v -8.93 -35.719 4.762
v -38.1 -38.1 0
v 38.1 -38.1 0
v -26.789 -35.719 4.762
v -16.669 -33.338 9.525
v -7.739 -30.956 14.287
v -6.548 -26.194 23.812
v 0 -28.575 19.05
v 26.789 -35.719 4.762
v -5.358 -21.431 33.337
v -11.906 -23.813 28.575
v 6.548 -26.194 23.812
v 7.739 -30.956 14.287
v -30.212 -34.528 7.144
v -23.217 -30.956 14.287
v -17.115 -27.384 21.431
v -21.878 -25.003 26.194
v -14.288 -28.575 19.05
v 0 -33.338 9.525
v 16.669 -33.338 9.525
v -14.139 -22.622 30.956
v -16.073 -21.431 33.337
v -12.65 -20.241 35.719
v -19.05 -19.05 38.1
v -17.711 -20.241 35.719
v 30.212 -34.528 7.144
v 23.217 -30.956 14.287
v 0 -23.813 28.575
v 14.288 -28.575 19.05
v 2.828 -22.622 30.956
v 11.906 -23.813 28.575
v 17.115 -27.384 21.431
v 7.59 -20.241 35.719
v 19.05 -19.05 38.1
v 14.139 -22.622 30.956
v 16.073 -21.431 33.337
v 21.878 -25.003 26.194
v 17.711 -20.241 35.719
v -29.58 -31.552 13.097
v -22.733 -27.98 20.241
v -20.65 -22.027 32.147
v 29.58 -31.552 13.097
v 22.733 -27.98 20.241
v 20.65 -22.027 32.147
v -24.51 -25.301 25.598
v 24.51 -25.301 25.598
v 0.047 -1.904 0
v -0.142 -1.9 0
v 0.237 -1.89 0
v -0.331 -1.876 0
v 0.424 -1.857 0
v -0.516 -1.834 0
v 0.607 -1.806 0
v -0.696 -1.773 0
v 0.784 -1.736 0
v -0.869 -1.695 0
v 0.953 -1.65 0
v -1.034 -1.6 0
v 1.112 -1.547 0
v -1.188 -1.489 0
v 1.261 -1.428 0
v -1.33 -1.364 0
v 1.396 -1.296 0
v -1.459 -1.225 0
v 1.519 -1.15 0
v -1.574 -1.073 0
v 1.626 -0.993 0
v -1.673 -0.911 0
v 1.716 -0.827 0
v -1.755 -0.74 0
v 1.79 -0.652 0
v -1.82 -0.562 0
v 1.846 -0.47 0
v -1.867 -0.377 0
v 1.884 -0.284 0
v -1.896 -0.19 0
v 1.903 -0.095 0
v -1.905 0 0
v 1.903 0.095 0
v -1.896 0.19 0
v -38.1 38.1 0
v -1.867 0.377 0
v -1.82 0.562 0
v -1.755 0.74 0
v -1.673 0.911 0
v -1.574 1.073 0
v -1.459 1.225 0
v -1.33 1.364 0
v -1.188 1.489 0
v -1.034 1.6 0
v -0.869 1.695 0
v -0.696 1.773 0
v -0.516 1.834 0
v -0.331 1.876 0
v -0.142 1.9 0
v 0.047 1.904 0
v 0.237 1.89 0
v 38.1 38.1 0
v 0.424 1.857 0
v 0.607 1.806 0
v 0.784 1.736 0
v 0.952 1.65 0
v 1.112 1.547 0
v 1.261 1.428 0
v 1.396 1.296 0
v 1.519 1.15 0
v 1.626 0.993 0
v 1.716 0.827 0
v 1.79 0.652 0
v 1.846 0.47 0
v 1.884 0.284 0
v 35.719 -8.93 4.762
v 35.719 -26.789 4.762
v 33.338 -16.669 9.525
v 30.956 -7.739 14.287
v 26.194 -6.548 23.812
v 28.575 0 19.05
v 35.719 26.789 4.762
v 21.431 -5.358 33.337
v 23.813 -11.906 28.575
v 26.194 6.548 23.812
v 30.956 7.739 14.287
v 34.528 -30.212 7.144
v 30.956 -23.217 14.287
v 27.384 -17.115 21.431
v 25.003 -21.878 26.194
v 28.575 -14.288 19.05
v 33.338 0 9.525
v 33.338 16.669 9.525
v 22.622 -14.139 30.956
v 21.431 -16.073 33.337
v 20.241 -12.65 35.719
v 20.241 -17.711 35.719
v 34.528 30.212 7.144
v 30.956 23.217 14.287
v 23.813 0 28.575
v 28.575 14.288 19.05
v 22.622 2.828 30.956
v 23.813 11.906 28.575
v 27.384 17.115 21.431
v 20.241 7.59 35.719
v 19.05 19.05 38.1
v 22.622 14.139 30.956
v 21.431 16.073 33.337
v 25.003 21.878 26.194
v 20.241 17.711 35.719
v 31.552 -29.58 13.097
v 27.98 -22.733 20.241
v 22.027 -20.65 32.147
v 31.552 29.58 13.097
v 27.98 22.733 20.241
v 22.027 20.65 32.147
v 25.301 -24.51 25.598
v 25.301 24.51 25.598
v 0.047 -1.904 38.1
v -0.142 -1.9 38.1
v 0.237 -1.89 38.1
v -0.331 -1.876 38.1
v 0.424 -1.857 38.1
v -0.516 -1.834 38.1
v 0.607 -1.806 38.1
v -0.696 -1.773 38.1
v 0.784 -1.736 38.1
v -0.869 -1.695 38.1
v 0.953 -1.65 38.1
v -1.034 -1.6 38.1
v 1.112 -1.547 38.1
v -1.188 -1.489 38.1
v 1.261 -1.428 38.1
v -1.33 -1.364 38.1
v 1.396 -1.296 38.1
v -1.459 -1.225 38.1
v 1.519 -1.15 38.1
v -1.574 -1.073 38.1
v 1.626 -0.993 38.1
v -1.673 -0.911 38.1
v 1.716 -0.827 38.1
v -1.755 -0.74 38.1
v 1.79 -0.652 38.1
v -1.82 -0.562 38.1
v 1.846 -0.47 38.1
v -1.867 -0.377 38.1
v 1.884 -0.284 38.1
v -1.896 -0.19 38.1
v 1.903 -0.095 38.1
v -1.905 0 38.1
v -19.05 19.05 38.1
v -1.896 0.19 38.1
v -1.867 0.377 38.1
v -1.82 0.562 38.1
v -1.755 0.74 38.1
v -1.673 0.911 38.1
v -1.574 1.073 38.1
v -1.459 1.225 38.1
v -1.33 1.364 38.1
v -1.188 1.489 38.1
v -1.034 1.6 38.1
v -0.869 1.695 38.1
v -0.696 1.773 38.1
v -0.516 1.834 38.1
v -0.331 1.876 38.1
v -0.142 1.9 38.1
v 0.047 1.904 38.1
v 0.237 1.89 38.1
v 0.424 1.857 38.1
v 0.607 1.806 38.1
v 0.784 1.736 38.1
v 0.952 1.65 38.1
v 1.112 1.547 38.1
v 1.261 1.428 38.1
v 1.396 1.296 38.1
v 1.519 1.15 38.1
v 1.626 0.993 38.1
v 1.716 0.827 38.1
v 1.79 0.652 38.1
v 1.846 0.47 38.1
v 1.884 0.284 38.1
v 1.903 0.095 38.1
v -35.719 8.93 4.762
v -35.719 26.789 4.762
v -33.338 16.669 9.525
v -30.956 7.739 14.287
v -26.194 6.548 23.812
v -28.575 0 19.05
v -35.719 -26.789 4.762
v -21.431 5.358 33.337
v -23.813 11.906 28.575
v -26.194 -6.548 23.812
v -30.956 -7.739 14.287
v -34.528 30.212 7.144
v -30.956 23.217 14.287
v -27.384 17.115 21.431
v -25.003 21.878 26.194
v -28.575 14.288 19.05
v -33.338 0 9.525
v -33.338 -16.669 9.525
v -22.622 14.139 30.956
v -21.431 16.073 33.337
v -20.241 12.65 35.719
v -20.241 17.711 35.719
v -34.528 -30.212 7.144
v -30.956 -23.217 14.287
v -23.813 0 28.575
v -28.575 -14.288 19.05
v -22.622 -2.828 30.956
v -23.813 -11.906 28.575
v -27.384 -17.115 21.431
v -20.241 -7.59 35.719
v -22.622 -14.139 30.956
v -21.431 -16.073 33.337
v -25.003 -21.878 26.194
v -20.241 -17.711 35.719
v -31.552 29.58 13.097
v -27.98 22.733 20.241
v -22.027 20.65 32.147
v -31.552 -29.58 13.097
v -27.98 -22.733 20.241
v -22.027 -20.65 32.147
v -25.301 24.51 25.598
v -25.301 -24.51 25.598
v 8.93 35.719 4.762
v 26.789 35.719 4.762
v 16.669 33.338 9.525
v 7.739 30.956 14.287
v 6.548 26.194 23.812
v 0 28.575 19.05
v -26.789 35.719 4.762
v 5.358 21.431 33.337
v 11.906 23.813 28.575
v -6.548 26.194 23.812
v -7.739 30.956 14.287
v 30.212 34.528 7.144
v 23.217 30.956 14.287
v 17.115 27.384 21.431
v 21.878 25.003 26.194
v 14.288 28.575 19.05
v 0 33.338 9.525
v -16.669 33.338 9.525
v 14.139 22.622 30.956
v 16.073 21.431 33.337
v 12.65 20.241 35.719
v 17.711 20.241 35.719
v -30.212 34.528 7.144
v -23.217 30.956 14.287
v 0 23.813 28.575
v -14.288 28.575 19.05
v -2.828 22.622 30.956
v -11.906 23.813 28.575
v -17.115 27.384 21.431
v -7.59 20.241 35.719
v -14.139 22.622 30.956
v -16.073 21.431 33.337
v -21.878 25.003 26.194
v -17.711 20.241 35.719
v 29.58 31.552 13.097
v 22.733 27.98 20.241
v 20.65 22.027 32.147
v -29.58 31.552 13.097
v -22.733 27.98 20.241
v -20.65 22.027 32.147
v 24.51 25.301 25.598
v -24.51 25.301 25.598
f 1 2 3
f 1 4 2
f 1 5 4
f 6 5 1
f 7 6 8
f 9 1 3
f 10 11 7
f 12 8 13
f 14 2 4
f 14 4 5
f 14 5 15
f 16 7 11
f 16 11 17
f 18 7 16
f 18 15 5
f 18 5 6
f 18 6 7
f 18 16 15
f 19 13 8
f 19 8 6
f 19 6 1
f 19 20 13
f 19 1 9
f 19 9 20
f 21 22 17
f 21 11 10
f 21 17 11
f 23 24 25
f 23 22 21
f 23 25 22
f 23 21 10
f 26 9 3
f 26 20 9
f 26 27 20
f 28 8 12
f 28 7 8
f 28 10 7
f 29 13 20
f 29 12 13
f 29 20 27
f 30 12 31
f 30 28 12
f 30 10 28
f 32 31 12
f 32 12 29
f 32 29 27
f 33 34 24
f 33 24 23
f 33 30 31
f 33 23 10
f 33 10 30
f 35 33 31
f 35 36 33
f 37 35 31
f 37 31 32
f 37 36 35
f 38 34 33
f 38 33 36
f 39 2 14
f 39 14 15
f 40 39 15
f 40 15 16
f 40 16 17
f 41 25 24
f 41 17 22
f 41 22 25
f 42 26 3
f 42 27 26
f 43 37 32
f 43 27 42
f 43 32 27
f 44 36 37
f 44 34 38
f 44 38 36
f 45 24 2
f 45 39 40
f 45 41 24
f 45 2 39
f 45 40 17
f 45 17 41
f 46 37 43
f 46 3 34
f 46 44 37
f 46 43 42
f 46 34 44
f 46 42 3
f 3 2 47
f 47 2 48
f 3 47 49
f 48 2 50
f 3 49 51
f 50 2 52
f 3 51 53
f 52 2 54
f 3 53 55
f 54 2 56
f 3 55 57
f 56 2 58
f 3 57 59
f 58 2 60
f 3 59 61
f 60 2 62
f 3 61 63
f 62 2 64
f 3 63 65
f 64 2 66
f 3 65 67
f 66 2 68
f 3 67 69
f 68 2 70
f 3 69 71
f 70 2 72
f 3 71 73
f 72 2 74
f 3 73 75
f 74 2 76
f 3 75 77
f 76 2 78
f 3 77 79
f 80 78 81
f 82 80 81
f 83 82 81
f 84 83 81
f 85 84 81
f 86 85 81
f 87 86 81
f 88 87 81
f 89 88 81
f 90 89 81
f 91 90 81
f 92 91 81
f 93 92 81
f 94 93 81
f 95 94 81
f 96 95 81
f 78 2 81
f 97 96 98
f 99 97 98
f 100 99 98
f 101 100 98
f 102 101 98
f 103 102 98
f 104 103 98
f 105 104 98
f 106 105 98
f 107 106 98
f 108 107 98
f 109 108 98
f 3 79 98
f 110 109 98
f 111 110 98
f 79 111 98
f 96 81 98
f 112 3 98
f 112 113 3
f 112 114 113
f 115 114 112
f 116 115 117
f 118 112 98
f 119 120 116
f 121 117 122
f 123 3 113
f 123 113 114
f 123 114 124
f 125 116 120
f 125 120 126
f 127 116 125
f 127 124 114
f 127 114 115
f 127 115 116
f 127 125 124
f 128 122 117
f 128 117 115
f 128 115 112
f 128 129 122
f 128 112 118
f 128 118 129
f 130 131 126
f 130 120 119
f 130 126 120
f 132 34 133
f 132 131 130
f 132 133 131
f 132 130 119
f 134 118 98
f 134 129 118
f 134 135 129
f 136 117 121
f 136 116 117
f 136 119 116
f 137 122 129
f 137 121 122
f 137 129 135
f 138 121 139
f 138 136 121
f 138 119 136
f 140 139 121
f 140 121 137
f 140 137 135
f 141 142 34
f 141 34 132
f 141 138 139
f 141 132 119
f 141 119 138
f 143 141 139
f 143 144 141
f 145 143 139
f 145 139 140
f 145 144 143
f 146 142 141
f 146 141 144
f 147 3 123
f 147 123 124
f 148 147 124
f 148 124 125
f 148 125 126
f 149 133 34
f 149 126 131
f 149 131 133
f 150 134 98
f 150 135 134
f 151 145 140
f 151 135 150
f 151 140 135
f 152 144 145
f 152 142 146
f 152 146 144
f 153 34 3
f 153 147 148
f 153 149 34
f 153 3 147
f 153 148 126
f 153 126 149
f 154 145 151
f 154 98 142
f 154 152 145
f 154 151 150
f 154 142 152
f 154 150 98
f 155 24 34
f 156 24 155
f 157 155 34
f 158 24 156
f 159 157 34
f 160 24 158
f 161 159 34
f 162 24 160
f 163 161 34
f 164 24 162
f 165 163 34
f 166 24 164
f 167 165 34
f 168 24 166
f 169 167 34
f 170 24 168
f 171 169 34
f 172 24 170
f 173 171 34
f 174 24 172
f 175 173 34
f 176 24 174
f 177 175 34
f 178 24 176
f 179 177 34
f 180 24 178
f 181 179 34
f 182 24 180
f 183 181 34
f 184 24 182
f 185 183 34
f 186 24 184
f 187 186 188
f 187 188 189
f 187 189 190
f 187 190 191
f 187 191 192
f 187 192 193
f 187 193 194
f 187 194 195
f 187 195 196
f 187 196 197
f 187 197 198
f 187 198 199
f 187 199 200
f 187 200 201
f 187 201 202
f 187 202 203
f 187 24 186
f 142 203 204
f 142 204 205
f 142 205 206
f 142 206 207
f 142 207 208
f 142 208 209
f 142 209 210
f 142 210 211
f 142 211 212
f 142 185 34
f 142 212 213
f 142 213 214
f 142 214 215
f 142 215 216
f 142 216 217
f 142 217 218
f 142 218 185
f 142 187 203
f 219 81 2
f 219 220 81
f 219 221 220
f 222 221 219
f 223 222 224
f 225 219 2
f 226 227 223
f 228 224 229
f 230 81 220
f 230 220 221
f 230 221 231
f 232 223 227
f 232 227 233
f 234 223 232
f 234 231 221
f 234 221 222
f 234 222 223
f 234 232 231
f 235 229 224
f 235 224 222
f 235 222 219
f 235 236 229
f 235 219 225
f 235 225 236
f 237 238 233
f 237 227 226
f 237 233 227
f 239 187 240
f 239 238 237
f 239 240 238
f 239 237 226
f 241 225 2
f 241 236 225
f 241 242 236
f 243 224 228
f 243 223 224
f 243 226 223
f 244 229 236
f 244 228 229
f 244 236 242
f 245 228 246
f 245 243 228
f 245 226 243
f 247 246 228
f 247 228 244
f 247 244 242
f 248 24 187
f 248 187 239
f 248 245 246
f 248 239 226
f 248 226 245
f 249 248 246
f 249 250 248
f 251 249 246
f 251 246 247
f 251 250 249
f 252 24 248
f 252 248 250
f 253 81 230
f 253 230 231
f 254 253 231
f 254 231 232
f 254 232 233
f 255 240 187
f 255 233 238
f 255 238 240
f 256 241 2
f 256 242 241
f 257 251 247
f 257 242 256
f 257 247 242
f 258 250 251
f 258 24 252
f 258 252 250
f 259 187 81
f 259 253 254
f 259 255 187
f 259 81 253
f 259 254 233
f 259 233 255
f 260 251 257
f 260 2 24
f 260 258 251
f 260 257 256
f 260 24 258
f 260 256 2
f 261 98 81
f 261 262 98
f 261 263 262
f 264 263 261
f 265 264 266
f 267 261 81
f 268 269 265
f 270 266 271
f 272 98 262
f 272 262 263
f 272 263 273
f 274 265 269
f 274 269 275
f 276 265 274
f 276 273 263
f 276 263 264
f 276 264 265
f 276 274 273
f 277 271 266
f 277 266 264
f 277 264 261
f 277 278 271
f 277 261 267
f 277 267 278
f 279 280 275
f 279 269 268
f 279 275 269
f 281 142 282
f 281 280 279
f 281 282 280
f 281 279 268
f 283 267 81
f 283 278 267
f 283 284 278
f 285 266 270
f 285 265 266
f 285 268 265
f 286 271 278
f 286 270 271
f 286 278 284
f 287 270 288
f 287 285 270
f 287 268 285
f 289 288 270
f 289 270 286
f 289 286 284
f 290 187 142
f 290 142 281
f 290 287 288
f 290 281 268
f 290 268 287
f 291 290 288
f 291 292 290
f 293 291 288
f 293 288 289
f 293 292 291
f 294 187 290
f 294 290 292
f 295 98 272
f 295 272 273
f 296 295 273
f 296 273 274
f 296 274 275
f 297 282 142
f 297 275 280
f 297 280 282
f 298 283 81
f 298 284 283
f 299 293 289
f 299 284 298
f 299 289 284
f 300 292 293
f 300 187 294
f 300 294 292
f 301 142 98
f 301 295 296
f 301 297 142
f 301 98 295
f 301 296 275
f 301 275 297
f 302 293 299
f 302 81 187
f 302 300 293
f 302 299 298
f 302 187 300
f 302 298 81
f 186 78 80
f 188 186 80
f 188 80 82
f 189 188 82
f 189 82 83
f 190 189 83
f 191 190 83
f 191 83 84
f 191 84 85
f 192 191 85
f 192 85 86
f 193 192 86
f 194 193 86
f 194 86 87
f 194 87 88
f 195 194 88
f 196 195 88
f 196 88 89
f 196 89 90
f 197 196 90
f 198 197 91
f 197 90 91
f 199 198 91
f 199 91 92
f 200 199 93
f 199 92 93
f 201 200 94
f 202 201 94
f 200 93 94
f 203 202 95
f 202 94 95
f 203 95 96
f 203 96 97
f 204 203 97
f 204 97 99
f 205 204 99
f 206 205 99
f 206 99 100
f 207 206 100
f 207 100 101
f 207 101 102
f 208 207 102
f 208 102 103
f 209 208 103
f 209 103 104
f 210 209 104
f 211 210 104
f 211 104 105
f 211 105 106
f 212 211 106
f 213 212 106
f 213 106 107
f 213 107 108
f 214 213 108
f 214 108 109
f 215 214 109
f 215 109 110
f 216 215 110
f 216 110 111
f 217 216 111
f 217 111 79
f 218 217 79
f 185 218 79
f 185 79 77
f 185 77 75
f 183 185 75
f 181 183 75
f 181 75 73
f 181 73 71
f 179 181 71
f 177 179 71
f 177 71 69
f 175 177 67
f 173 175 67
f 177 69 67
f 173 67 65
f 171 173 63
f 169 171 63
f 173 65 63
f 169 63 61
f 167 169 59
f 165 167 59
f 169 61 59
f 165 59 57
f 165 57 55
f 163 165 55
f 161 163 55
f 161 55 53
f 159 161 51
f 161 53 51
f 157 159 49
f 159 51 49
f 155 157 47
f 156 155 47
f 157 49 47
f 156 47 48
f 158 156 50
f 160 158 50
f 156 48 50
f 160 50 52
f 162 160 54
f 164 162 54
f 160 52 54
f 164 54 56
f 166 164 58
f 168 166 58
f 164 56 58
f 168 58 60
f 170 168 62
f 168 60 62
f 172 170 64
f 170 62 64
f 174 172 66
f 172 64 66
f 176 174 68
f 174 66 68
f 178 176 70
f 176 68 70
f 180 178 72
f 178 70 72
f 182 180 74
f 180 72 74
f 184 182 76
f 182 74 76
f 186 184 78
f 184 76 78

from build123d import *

# Parameters (mm, degrees)
F0_W  = 76.2
F0_H  = 76.2
F2_W  = 38.1
F2_H  = 38.1
F4_W  = 38.1
F4_H  = 38.1
F8_D  = 3.81
F10_D = 3.81


with BuildPart() as f3:
    # F0 (on Top) → F3 section 0
    with BuildSketch(Plane.XY):
        Rectangle(F0_W, F0_H)
    # F2 (on offset) → F3 section 1
    with BuildSketch(Plane.XY.offset(38.1)):
        Rectangle(F2_W, F2_H)
    loft()

    # F10 (through all)
    with Locations(Plane.XY.offset(38.1)):
        with Locations((0, 0)):
            Hole(F10_D / 2)


with BuildPart() as f6:
    # F4 (on offset) → F6 section 0
    with BuildSketch(Plane.XY.offset(38.1), mode=Mode.PRIVATE) as f6_s0:
        Rectangle(F4_W, F4_H)
    loft([f6_s0.sketch, Vertex(0, 0, 76.5771791339)])

    # F8 (through all)
    with Locations(Plane(origin=(0, 0, 38.1), x_dir=(1, 0, 0), z_dir=(0, 0, -1))):
        with Locations((0, 0)):
            Hole(F8_D / 2)


solid = f3.part
